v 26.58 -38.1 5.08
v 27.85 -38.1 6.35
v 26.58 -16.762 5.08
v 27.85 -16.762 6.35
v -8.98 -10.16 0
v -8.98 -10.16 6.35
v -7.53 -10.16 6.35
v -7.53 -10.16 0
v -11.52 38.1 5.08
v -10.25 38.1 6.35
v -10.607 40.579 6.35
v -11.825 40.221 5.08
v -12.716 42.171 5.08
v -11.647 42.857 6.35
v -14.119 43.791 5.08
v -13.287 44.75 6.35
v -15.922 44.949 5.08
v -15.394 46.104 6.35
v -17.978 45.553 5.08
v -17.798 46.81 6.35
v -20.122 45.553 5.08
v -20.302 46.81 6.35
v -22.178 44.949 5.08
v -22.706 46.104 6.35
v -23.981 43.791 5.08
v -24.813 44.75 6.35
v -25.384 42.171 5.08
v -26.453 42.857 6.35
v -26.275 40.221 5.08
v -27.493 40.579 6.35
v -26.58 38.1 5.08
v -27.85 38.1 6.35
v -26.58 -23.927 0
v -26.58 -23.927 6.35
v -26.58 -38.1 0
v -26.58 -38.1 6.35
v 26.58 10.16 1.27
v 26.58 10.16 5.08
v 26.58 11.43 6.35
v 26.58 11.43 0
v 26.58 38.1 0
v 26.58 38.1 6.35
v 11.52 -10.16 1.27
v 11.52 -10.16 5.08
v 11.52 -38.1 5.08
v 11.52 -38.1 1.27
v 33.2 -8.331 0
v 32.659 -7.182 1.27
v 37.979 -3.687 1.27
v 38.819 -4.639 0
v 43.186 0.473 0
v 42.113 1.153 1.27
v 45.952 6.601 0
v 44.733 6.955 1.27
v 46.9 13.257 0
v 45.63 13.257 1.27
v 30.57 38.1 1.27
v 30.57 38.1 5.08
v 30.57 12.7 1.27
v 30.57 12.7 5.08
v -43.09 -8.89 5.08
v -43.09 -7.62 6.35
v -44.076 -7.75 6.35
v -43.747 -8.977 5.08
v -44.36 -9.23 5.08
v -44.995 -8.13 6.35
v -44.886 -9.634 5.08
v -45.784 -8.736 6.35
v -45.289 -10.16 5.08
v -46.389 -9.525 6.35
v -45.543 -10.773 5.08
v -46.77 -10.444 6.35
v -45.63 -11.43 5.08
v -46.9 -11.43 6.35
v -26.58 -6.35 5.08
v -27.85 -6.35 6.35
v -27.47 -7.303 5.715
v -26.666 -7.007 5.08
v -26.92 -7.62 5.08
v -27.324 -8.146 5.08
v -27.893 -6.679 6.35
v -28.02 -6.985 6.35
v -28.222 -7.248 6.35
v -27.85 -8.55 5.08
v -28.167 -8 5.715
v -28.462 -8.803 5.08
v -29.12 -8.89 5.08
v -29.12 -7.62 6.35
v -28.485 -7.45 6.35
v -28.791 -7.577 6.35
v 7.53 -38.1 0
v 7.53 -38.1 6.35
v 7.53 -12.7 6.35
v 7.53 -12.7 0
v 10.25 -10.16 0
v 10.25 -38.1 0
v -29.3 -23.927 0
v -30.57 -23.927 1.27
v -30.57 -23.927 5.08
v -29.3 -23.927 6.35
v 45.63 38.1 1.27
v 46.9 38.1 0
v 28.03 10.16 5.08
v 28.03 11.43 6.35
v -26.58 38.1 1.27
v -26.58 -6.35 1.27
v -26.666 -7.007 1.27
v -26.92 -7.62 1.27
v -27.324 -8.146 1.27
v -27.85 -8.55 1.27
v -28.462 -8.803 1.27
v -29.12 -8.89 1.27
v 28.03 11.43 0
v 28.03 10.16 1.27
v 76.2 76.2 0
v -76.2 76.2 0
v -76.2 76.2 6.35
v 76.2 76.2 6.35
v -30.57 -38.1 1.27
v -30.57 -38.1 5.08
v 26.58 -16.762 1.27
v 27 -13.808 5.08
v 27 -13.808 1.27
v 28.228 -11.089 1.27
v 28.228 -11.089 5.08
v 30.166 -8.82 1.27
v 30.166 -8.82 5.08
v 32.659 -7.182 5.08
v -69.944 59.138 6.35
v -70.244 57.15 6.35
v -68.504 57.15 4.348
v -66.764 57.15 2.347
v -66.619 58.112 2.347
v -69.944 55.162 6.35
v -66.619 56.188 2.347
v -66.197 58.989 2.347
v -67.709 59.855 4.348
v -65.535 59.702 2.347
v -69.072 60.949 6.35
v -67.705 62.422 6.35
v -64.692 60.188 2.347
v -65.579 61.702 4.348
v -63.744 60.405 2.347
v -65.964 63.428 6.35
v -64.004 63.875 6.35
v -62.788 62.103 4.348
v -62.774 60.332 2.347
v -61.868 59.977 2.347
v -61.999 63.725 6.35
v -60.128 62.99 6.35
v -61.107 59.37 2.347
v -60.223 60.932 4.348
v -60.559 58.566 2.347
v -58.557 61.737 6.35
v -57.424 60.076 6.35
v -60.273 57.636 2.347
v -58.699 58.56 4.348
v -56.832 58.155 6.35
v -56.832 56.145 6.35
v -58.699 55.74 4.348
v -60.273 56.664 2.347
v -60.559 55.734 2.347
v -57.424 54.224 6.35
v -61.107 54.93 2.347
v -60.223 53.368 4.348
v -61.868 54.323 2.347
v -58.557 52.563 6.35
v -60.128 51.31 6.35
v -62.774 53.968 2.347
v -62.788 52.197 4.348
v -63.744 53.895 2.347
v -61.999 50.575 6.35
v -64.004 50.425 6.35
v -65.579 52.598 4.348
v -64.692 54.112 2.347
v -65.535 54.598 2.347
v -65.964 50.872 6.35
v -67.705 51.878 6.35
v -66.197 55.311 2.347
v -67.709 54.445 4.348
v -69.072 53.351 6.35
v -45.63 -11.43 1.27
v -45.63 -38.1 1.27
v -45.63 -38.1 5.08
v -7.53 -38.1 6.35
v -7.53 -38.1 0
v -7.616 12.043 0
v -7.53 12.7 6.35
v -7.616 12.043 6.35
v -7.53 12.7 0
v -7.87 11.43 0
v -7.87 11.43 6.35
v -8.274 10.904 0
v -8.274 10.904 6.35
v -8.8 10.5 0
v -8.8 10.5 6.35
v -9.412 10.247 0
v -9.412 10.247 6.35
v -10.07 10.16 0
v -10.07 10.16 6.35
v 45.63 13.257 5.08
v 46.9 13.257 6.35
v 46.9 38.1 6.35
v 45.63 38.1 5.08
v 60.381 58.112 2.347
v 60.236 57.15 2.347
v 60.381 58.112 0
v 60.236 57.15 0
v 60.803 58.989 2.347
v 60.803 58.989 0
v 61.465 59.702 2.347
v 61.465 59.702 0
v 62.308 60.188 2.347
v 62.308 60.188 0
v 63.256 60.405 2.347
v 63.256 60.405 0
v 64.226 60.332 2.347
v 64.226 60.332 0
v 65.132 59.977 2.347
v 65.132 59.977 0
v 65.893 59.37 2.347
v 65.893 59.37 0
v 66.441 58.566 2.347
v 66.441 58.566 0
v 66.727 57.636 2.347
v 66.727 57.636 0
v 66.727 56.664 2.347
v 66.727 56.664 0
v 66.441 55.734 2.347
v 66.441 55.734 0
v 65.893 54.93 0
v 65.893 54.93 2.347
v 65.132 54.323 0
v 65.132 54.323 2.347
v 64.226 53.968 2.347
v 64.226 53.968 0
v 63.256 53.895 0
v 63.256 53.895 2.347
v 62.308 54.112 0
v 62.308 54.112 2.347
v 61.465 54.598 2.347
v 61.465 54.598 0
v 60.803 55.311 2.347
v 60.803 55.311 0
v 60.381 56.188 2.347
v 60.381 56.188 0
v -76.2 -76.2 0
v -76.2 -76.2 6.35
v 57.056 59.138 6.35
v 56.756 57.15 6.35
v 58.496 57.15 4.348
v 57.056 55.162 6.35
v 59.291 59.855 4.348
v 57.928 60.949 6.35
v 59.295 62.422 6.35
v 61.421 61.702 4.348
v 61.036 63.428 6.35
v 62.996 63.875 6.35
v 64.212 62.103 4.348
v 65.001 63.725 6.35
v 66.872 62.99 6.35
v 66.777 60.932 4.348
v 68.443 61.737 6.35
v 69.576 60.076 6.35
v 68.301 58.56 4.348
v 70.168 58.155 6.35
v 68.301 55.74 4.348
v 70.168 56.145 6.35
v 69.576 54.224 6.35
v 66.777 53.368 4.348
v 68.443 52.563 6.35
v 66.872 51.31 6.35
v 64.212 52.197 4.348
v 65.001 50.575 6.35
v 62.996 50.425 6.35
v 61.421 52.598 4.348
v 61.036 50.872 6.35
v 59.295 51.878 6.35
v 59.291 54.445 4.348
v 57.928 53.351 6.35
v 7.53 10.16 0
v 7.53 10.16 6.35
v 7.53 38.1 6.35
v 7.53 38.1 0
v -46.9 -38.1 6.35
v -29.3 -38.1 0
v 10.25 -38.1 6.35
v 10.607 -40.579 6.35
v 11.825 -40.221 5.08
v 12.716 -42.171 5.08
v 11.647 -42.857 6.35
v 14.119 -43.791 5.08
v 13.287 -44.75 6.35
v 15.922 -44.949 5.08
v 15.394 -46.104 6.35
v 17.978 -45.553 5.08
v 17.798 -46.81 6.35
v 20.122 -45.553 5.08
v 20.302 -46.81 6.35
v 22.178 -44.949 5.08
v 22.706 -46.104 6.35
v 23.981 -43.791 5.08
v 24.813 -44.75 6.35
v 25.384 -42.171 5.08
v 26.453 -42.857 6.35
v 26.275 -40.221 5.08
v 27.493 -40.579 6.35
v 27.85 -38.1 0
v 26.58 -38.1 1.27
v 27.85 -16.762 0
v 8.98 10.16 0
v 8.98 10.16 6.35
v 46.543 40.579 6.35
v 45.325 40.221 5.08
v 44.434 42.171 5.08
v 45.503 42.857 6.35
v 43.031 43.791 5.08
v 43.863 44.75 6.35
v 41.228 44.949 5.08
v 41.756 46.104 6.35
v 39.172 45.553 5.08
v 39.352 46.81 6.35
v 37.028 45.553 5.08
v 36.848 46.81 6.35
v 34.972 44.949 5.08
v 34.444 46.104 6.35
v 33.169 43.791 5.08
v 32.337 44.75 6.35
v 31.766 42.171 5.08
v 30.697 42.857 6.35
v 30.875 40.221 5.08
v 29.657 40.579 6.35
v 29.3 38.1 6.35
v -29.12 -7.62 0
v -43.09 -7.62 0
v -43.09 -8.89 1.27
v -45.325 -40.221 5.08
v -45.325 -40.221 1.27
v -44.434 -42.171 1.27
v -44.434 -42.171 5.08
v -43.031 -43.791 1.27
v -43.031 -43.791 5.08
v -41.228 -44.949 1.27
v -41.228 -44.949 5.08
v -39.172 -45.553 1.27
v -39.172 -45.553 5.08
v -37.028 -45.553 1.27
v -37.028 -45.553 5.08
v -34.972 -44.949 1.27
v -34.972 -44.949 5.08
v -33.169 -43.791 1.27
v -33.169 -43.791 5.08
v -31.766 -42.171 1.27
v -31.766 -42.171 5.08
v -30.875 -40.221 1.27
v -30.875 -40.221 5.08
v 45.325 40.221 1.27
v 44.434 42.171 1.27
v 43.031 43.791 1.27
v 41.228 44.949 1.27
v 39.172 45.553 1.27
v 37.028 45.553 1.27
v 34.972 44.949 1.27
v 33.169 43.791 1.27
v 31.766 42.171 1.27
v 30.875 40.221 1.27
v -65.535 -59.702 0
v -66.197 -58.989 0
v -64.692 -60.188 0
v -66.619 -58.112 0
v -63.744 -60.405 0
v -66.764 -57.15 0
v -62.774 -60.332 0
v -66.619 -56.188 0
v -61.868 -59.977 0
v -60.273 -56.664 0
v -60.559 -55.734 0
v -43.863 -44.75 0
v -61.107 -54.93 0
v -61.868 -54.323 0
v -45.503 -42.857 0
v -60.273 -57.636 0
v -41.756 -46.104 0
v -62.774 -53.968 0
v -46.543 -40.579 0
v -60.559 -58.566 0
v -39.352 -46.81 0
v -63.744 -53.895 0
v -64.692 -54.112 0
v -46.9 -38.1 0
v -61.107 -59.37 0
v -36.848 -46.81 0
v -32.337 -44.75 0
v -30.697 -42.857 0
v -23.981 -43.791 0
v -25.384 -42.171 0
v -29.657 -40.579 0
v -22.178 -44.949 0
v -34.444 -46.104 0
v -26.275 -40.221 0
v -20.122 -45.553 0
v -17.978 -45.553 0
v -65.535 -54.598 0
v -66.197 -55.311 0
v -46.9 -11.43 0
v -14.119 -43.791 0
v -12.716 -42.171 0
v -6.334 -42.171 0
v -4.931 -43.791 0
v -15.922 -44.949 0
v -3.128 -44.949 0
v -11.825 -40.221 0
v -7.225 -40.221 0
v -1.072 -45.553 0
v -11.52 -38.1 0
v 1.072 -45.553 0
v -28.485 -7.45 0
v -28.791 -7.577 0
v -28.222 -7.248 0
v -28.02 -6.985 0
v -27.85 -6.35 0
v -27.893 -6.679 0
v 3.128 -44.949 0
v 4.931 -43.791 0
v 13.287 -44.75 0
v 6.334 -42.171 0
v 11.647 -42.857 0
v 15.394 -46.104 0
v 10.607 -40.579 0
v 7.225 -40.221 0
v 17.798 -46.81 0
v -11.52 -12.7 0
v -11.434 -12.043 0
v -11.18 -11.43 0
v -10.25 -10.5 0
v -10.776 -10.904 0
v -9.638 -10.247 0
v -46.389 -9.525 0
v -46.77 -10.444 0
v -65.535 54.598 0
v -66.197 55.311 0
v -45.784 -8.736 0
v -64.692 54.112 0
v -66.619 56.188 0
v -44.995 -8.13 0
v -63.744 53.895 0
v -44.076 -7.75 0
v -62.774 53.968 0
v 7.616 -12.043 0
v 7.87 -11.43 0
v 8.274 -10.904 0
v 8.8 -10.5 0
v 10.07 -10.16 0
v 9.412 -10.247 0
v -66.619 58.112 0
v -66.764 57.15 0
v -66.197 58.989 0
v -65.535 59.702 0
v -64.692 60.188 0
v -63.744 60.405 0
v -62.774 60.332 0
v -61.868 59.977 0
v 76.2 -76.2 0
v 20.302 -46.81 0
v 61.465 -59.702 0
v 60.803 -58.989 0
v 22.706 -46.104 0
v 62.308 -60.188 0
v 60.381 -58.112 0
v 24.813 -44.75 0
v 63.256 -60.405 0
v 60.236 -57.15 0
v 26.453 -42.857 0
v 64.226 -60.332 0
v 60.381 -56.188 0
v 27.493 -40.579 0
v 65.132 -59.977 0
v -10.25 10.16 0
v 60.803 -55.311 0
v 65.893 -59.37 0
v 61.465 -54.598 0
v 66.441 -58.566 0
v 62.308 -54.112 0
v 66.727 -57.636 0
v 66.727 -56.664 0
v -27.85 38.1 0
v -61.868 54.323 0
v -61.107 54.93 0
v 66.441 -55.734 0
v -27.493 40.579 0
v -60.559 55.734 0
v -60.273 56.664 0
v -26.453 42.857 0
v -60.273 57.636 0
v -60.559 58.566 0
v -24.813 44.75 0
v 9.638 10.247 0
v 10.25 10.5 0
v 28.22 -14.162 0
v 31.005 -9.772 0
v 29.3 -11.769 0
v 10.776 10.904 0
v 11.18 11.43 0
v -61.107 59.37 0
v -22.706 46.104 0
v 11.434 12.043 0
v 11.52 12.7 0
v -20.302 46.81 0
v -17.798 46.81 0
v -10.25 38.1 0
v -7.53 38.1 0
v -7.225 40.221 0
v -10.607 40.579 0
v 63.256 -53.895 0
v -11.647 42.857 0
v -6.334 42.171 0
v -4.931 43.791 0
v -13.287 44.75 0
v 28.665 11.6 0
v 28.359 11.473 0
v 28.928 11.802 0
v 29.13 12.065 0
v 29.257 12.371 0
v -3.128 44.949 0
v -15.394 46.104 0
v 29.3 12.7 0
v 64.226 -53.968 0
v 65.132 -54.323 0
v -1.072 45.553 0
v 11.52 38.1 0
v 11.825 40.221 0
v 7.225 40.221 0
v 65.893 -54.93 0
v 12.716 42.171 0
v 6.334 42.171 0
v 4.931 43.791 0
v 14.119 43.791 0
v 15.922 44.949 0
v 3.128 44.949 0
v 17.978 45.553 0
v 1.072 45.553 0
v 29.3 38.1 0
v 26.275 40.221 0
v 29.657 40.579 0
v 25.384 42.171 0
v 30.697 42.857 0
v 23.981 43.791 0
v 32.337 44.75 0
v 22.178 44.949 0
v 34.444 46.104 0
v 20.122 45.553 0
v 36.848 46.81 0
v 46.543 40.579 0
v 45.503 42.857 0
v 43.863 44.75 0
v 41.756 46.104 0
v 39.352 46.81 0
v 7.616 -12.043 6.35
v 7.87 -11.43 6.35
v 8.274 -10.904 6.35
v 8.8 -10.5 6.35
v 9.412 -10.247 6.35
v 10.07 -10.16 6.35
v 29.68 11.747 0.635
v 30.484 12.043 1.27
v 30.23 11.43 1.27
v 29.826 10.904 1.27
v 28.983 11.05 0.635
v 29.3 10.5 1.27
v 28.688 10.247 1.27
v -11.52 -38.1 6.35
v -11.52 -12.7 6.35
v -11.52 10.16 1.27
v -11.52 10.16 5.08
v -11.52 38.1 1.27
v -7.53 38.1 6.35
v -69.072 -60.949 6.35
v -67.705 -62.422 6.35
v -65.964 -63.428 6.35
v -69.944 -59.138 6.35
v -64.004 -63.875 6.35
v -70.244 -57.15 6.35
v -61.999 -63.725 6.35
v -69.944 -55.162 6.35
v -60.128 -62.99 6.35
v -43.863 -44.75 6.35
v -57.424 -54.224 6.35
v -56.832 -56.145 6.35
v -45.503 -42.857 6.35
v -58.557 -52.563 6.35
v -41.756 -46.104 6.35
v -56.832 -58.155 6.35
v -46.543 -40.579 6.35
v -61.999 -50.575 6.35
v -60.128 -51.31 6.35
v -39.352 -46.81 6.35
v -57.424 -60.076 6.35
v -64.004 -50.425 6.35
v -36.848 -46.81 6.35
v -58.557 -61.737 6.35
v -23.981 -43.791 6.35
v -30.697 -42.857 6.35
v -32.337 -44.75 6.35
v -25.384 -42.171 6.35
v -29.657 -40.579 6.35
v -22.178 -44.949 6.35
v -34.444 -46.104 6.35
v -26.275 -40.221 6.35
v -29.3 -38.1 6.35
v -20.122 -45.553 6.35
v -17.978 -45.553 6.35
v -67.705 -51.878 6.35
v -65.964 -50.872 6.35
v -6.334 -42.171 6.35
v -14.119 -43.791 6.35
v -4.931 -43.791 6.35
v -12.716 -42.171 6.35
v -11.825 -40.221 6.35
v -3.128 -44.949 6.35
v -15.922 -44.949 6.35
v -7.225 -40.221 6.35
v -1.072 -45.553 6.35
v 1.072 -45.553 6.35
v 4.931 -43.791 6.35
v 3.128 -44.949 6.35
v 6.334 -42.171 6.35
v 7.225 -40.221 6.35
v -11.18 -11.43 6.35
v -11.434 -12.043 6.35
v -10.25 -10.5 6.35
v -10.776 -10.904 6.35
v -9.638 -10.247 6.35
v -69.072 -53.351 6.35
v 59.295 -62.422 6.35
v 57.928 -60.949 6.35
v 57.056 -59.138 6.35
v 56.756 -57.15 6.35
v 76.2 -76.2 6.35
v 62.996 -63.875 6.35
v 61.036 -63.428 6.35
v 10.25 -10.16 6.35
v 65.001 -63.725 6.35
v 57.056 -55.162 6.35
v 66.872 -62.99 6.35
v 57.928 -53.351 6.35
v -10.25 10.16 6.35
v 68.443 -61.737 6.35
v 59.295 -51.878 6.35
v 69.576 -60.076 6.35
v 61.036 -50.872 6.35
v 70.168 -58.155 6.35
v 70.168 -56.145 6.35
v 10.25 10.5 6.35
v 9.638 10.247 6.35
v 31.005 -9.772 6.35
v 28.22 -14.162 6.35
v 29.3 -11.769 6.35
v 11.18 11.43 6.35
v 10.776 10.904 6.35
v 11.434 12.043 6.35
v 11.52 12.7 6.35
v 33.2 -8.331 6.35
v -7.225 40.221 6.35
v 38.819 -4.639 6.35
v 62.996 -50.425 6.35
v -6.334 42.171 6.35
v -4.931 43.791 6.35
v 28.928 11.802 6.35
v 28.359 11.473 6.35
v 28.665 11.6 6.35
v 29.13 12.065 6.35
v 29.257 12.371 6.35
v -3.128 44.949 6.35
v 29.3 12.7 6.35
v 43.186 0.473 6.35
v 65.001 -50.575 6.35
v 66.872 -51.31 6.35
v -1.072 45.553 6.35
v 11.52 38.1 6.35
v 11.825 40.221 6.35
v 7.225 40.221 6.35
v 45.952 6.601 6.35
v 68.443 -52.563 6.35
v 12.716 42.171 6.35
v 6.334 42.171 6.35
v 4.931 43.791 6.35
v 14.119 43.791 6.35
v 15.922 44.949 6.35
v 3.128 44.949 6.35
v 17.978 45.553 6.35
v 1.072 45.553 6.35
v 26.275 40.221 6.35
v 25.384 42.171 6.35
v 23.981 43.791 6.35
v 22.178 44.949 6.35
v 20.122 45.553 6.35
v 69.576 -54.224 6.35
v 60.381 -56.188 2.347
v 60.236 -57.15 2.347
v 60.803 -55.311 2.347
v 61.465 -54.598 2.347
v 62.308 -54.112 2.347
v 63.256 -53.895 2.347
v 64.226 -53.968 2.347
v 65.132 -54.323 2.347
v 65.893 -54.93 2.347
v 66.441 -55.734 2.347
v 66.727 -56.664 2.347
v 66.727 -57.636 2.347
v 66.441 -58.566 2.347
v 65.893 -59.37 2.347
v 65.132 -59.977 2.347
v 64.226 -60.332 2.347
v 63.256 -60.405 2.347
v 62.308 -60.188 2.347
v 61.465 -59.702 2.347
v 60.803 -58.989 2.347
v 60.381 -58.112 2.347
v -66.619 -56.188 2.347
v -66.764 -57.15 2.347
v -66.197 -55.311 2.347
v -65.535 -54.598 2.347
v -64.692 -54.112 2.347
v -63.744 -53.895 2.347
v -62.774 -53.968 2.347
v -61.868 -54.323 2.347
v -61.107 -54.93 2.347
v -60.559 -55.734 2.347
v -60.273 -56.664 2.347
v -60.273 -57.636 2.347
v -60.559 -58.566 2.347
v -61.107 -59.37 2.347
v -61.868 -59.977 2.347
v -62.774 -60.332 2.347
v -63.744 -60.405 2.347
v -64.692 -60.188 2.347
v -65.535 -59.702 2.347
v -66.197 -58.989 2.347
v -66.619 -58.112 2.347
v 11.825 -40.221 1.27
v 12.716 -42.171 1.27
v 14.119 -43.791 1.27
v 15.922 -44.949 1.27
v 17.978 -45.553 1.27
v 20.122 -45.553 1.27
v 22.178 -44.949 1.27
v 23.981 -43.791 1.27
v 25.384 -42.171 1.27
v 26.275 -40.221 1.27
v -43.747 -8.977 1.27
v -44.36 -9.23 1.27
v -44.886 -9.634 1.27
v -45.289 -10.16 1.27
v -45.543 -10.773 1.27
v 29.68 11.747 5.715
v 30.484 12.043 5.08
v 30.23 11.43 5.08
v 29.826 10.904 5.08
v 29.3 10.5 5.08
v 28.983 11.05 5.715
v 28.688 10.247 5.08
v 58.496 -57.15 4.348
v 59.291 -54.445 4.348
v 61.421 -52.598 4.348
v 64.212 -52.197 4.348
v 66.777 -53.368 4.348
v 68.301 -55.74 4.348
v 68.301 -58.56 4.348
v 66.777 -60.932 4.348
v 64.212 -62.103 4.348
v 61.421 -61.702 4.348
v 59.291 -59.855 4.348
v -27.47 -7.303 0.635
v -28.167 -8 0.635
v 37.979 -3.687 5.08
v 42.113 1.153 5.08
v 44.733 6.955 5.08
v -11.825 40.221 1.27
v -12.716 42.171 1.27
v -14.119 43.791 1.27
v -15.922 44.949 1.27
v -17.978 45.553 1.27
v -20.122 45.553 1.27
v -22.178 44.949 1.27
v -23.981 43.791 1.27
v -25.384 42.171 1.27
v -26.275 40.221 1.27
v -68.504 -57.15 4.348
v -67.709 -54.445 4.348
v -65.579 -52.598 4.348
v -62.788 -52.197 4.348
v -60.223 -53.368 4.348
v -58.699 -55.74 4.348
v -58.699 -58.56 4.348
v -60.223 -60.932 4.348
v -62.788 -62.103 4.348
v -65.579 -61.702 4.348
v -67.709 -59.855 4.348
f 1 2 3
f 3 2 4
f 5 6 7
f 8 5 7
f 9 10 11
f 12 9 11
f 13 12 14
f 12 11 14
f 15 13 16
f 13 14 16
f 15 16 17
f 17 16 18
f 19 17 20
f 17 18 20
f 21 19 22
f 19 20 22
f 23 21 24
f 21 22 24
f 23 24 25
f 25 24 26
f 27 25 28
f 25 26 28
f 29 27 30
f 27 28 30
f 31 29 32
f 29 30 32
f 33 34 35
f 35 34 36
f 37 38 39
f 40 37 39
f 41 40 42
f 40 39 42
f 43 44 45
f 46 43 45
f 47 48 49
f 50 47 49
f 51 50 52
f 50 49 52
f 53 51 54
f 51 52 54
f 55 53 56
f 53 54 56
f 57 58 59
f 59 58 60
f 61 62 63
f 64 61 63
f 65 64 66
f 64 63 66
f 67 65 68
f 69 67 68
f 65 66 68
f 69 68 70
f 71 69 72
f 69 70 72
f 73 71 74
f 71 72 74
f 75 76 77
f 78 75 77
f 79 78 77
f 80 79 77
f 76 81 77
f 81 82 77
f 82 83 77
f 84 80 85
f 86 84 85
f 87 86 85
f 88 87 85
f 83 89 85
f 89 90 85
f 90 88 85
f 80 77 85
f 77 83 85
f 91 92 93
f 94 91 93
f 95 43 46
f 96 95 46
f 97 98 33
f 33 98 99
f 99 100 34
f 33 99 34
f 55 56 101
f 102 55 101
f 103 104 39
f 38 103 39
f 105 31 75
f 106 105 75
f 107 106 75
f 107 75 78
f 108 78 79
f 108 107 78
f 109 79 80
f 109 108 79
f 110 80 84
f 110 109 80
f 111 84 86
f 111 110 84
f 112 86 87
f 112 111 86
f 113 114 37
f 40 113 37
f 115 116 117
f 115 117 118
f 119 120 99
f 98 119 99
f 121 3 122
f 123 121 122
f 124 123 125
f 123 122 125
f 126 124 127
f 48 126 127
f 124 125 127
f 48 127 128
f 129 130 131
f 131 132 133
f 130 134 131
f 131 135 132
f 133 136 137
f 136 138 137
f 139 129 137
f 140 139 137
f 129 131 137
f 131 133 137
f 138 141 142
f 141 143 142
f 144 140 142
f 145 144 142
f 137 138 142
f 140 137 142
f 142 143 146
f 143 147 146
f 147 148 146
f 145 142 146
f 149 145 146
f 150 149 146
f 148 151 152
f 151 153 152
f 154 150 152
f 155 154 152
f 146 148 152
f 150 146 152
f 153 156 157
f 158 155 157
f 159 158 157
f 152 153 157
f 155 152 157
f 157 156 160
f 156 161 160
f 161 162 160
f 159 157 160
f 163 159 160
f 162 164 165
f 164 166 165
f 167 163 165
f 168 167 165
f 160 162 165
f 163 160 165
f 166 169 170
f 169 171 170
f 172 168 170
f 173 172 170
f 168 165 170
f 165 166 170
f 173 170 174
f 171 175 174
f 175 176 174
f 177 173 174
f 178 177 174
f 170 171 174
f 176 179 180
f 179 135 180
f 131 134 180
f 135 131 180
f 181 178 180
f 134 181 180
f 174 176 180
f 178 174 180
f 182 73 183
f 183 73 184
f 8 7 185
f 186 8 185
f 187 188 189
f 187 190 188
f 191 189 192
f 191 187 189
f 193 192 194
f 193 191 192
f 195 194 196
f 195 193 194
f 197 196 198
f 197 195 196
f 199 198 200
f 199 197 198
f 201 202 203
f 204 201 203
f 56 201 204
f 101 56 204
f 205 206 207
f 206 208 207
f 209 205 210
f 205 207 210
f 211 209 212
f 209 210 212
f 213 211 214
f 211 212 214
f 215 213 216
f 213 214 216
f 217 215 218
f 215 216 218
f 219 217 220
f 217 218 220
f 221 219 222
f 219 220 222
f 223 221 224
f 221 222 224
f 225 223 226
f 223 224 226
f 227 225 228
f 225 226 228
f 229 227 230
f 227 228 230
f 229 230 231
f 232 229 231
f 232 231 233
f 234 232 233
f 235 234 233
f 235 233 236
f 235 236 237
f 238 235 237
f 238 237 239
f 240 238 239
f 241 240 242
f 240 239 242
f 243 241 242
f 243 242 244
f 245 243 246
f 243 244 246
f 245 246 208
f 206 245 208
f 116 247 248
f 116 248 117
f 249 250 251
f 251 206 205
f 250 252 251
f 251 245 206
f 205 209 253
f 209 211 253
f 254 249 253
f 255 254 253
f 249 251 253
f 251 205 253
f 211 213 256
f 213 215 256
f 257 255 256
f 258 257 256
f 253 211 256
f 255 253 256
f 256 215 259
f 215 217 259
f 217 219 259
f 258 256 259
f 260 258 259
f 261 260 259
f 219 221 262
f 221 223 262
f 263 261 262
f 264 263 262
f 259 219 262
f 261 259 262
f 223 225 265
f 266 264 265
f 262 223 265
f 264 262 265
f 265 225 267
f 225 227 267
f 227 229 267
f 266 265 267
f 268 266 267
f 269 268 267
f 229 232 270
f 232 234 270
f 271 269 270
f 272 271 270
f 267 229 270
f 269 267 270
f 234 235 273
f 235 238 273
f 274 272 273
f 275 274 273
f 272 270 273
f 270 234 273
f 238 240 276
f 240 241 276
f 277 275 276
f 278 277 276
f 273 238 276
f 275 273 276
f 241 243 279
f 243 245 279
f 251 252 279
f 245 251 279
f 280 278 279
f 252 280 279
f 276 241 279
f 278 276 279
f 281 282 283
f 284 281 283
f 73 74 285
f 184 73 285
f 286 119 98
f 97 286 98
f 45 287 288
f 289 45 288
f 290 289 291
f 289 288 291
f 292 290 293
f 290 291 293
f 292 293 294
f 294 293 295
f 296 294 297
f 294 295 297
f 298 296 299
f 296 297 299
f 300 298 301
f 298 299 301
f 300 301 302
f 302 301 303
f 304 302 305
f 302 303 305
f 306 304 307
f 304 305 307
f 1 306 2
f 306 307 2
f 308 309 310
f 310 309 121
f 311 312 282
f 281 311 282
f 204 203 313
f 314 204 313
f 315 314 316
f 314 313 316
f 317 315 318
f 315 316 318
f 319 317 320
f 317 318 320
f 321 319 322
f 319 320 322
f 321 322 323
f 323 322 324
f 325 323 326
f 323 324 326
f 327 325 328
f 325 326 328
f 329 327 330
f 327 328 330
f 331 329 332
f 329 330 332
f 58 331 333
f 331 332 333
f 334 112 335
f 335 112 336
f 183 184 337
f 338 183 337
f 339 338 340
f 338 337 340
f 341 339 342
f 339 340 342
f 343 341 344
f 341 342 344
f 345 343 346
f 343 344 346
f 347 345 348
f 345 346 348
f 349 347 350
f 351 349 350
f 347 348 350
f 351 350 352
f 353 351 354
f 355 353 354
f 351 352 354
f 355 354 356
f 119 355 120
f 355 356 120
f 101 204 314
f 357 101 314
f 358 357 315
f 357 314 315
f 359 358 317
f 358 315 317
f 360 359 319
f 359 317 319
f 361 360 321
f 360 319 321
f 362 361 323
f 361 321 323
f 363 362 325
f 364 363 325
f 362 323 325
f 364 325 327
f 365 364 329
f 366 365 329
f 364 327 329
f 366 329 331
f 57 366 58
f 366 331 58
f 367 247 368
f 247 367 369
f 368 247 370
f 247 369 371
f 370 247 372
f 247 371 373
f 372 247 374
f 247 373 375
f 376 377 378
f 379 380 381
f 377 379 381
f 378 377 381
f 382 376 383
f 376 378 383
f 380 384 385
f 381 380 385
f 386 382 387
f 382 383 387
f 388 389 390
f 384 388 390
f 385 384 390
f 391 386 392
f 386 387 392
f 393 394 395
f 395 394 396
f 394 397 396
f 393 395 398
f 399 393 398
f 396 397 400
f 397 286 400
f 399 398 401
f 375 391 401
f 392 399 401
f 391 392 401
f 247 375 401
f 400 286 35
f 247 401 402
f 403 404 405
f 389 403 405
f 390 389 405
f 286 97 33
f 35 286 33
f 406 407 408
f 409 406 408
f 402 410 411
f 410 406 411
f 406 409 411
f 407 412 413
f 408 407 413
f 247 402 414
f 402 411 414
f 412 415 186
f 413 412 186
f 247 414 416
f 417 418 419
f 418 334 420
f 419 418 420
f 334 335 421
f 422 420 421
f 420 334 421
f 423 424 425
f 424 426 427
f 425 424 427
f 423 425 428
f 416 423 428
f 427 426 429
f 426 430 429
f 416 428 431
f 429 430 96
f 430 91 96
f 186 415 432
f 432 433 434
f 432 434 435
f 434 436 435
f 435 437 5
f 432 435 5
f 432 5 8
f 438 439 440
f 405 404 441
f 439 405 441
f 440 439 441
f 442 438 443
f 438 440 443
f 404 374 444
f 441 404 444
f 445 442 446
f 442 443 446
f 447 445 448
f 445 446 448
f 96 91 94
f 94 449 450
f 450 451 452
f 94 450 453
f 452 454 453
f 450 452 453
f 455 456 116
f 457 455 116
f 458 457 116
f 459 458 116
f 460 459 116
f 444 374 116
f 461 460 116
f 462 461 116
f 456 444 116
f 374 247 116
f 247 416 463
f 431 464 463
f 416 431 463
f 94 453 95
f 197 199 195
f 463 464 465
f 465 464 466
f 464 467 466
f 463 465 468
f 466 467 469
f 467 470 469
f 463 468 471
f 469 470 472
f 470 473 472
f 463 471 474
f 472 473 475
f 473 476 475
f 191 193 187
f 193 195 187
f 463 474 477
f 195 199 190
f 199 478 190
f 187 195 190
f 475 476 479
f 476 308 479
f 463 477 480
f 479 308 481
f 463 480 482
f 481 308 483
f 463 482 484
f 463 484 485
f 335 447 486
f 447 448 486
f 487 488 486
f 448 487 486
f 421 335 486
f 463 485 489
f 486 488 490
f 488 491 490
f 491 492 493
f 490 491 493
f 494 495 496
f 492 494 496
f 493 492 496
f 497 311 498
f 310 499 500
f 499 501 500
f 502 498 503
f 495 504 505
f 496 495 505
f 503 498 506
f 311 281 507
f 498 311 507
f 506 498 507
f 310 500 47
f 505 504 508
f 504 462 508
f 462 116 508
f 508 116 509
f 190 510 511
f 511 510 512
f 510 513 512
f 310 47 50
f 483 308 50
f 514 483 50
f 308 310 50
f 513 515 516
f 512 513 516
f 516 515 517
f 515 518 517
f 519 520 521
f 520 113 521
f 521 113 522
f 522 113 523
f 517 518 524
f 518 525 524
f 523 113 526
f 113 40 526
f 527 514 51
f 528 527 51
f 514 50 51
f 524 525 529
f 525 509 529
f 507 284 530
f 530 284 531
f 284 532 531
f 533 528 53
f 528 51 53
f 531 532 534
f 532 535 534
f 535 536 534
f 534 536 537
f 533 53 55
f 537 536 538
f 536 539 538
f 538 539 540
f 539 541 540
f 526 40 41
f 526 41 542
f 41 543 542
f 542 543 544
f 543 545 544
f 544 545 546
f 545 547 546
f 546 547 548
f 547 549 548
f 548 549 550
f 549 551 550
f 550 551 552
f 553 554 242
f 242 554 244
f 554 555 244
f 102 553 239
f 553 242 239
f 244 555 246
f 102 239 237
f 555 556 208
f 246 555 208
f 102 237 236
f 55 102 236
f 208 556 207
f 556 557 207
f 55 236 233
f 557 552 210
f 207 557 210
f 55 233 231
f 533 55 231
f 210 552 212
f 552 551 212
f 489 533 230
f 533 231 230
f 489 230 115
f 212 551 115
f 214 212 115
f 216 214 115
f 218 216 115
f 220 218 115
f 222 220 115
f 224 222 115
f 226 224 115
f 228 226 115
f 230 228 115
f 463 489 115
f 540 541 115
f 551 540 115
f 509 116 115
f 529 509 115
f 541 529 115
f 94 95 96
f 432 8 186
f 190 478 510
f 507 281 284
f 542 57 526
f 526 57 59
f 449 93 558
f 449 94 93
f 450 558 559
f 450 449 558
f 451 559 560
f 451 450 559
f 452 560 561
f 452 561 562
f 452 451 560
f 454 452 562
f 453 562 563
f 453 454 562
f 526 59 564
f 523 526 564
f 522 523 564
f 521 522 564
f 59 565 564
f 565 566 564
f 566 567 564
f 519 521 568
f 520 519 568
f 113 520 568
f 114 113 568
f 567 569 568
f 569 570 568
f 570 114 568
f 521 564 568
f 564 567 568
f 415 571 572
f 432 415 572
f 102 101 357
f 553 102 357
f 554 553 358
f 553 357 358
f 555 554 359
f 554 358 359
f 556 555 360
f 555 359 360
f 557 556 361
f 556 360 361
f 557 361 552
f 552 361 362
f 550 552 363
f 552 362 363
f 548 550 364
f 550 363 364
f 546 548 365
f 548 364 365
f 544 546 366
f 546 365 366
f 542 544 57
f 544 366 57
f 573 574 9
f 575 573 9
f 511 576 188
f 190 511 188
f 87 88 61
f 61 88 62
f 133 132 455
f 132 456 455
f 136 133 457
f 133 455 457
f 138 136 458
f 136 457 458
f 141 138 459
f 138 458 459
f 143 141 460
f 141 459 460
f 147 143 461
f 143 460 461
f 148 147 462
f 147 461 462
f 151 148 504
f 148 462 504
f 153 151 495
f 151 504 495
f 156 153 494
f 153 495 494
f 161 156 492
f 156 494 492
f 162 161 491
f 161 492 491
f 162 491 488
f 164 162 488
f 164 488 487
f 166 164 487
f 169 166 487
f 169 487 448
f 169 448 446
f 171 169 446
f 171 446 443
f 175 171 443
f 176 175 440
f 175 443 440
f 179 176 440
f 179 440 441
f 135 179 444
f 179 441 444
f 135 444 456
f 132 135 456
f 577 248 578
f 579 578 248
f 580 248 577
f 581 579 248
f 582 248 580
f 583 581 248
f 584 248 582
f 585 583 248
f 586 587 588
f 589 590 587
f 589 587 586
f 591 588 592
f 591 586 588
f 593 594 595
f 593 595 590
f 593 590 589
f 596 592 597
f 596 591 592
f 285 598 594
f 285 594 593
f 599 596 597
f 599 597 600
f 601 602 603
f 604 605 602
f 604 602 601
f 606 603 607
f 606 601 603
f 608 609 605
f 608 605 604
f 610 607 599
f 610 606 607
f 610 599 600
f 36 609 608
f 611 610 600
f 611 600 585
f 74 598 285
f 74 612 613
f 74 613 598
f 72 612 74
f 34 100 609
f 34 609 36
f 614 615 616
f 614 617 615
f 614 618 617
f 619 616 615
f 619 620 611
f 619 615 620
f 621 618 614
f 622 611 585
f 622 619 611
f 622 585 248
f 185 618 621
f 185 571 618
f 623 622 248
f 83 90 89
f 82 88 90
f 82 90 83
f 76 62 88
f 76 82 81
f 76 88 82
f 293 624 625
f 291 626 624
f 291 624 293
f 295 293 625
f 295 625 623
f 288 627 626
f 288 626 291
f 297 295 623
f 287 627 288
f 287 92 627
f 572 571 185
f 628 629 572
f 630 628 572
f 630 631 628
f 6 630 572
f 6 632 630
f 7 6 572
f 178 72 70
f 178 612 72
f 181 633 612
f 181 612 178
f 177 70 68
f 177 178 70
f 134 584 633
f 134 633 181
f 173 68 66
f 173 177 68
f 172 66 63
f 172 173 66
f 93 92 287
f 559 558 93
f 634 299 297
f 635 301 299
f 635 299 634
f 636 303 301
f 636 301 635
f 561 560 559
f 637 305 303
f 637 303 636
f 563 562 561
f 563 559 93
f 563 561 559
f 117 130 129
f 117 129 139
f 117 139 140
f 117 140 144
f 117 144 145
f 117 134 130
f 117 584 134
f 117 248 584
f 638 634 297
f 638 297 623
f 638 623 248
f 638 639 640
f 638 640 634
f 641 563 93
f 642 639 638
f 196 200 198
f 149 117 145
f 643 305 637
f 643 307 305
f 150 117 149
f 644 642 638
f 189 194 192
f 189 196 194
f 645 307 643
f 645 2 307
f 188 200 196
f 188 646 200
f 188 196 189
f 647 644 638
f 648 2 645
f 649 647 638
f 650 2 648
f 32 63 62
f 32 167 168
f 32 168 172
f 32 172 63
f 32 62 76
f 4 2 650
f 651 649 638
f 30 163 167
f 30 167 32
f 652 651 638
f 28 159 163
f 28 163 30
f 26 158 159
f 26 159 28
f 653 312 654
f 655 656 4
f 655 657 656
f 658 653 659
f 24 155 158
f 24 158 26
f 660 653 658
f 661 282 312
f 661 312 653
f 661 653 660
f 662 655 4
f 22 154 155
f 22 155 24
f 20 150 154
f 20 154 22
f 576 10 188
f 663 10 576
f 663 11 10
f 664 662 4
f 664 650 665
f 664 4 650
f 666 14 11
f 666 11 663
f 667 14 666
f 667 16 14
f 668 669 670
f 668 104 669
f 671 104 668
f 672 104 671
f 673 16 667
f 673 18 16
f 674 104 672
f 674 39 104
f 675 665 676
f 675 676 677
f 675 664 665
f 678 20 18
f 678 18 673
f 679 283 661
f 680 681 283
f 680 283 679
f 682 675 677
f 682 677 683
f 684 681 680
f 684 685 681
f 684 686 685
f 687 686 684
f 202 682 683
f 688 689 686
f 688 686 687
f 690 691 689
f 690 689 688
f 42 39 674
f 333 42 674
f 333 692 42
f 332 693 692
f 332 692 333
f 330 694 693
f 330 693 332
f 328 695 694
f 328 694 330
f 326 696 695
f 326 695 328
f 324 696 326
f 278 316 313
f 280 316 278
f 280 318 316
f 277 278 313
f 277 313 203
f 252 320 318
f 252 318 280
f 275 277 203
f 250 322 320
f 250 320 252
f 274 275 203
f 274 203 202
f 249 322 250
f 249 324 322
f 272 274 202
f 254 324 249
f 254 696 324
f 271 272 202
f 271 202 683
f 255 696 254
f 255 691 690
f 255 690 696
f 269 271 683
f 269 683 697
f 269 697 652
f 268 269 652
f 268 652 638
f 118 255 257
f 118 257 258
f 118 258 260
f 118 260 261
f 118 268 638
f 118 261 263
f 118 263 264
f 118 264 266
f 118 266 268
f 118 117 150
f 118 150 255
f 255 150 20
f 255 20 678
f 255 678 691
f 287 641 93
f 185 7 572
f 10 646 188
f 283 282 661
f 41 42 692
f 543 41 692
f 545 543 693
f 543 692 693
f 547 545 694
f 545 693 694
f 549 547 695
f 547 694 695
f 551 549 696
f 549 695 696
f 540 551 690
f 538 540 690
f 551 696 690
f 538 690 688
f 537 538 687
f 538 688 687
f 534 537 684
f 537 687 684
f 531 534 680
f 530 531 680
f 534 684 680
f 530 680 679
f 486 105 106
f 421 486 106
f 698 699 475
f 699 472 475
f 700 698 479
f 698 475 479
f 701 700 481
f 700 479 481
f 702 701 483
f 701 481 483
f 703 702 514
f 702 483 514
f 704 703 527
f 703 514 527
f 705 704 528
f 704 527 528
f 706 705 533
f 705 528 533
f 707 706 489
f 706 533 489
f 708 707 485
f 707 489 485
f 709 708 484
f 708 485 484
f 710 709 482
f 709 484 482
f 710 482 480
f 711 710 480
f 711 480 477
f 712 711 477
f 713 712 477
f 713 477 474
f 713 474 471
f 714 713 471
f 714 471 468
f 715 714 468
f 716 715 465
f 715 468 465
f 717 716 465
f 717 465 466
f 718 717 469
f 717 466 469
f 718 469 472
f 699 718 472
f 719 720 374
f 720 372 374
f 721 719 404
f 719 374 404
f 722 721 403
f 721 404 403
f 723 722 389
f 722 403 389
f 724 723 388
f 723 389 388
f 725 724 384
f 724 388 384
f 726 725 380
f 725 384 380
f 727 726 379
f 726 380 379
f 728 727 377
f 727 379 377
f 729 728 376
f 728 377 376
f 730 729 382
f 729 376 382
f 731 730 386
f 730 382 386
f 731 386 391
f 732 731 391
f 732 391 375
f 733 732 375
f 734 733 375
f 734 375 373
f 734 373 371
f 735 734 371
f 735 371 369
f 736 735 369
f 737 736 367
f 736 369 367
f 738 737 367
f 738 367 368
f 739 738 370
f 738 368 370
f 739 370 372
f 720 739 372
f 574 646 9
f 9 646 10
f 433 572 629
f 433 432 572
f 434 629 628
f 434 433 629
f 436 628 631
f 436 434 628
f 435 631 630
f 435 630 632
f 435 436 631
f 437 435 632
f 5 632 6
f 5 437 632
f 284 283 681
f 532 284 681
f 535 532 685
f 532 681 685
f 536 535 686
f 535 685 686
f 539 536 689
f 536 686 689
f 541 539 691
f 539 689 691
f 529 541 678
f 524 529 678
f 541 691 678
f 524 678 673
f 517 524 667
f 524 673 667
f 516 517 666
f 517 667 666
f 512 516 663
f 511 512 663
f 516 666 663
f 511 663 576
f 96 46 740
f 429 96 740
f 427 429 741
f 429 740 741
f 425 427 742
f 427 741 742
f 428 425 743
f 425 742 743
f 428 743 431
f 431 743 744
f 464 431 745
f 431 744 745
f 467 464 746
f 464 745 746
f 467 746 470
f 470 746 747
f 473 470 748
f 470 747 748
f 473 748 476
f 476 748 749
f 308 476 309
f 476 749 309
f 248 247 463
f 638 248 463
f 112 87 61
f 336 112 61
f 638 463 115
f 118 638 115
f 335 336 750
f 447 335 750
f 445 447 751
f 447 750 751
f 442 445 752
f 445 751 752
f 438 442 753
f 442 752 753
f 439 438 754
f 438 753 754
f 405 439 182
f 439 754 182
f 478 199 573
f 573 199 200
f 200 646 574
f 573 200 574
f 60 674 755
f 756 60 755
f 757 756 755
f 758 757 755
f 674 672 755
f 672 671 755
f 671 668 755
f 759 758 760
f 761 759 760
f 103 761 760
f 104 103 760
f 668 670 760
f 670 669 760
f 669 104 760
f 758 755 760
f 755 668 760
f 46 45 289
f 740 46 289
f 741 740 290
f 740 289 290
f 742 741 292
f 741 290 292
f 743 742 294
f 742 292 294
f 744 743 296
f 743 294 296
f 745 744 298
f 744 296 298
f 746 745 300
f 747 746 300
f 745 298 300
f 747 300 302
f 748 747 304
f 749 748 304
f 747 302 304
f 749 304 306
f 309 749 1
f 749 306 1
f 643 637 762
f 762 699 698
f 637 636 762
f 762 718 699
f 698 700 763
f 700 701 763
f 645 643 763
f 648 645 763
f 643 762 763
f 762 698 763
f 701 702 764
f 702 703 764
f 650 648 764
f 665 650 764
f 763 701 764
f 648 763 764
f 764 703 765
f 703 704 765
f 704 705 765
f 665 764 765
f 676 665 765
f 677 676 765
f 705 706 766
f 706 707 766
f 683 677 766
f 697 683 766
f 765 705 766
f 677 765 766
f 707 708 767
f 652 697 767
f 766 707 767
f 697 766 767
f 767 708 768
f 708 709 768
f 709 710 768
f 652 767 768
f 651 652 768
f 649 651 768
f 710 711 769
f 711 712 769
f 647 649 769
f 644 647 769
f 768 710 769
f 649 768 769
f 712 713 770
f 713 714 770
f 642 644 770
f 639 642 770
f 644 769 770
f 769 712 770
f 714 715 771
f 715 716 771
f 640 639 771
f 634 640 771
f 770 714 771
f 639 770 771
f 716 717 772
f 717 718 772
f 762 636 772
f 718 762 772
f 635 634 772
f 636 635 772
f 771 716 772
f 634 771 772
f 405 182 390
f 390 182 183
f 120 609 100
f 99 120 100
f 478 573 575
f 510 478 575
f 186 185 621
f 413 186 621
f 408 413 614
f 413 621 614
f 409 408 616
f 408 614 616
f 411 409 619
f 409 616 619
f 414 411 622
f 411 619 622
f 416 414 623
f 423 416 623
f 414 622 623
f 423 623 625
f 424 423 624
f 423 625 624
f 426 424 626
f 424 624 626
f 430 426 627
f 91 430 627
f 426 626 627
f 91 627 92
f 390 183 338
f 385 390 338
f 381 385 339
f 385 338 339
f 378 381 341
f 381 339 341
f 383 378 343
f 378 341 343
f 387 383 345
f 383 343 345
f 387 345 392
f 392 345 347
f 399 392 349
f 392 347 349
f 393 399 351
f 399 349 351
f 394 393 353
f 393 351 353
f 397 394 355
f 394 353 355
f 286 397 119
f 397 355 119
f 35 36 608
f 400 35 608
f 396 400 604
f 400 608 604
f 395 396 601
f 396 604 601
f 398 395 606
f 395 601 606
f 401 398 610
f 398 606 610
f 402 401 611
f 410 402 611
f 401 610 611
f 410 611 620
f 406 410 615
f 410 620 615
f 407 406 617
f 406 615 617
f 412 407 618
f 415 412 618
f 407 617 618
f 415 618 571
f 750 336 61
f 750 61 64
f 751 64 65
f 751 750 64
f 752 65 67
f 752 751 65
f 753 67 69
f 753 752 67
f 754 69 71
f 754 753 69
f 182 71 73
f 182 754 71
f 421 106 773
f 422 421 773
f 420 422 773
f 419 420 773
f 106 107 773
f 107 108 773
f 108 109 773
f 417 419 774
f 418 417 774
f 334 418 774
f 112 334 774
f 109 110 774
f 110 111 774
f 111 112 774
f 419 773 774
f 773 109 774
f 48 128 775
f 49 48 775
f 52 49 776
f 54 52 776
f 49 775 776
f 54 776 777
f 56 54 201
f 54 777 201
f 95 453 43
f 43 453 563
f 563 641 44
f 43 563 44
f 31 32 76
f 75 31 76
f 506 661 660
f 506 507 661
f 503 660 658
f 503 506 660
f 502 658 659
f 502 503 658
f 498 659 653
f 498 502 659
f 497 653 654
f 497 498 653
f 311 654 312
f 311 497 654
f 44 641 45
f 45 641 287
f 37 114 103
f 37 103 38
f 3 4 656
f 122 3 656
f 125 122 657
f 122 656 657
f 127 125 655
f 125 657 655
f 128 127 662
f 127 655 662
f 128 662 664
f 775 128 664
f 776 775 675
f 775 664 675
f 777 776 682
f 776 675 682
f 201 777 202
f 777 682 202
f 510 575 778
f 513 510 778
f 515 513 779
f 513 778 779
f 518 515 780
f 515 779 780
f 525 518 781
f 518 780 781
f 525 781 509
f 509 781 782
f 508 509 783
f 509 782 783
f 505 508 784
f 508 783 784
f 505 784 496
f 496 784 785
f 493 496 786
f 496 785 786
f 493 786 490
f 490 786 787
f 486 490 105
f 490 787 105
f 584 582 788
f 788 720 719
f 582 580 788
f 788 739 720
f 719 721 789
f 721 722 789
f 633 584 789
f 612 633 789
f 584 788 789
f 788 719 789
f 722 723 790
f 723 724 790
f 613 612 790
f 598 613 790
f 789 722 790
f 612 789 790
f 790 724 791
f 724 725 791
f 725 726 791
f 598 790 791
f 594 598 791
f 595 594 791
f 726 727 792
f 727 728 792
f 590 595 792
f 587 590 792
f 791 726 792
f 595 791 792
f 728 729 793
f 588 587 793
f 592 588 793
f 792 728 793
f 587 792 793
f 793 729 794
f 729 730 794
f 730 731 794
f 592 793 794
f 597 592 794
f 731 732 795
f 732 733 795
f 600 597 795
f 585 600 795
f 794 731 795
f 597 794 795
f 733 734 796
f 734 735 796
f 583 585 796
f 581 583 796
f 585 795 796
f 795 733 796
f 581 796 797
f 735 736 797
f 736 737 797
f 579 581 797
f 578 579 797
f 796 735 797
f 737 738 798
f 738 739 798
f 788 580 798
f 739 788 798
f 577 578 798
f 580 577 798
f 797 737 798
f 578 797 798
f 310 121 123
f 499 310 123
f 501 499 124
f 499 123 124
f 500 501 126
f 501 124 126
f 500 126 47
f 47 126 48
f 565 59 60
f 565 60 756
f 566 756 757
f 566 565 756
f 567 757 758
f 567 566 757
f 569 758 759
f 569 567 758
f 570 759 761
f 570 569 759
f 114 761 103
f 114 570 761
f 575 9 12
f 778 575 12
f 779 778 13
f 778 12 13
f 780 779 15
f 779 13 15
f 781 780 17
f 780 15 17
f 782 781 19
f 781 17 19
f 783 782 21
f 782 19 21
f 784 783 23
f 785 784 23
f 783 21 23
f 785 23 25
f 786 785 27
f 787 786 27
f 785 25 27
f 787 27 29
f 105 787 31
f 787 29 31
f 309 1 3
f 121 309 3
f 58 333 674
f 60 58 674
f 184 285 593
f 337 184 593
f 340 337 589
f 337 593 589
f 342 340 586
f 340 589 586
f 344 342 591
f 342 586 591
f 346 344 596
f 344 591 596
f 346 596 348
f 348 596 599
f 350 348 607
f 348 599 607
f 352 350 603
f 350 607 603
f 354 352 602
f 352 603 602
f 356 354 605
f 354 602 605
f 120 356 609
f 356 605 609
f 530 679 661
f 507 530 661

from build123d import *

# Parameters (mm, degrees)
F0_W           = 152.4
F0_H           = 152.4
F1_DEPTH       = 6.35
F3_DEPTH       = 6.351
F4_R           = 2.54
F5_SIZE        = 1.27
F7_D           = 6.5278
F7_CSINK_D     = 13.4874
F7_CSINK_ANGLE = 82


with BuildPart() as f1:
    # F0 (on Top) → F1 (new body)
    with BuildSketch(Plane.XY):
        Rectangle(F0_W, F0_H)
    extrude(amount=F1_DEPTH)

    # F2 (on face) → F3 (cut, through all)
    with BuildSketch(Plane.XY.offset(6.35)):
        with BuildLine():
            Line((7.529644, 10.16), (7.529644, 38.1))
            ThreePointArc((7.529644, 38.1), (0, 45.629644), (-7.529644, 38.1))
            Line((-7.529644, 38.1), (-7.529644, 10.16))
            Line((-7.529644, 10.16), (-11.520356, 10.16))
            Line((-11.520356, 10.16), (-11.520356, 38.1))
            ThreePointArc((-11.520356, 38.1), (-19.05, 45.629644), (-26.579644, 38.1))
            Line((-26.579644, 38.1), (-26.579644, 0))
            Line((-26.579644, 0), (-26.579644, -8.89))
            Line((-26.579644, -8.89), (-45.629644, -8.89))
            Line((-45.629644, -8.89), (-45.629644, -38.1))
            ThreePointArc((-45.629644, -38.1), (-38.1, -45.629644), (-30.570356, -38.1))
            Line((-30.570356, -38.1), (-30.570356, -23.9268))
            Line((-30.570356, -23.9268), (-26.579644, -23.9268))
            Line((-26.579644, -23.9268), (-26.579644, -38.1))
            ThreePointArc((-26.579644, -38.1), (-19.05, -45.629644), (-11.520356, -38.1))
            Line((-11.520356, -38.1), (-11.520356, -10.16))
            Line((-11.520356, -10.16), (-7.529644, -10.16))
            Line((-7.529644, -10.16), (-7.529644, -38.1))
            ThreePointArc((-7.529644, -38.1), (0, -45.629644), (7.529644, -38.1))
            Line((7.529644, -38.1), (7.529644, -10.16))
            Line((7.529644, -10.16), (11.520356, -10.16))
            Line((11.520356, -10.16), (11.520356, -38.1))
            ThreePointArc((11.520356, -38.1), (19.05, -45.629644), (26.579644, -38.1))
            Line((26.579644, -38.1), (26.579644, -16.761795))
            ThreePointArc((26.579644, -16.761795), (28.227842, -11.088573), (32.659292, -7.181625))
            ThreePointArc((32.659292, -7.181625), (42.113371, 1.15348), (45.629644, 13.256762))
            Line((45.629644, 13.256762), (45.629644, 38.1))
            ThreePointArc((45.629644, 38.1), (38.1, 45.629644), (30.570356, 38.1))
            Line((30.570356, 38.1), (30.570356, 10.16))
            Line((30.570356, 10.16), (26.579644, 10.16))
            Line((26.579644, 10.16), (26.579644, 38.1))
            ThreePointArc((26.579644, 38.1), (19.05, 45.629644), (11.520356, 38.1))
            Line((11.520356, 38.1), (11.520356, 10.16))
            Line((11.520356, 10.16), (7.529644, 10.16))
        make_face()
    extrude(amount=-F3_DEPTH, mode=Mode.SUBTRACT)

    # F4
    f4_edges = [f1.edges().sort_by_distance(p)[0] for p in [
        (-7.529644, 10.16, 3.175),
        (-11.520356, -10.16, 3.175),
        (7.529644, -10.16, 3.175),
        (11.520356, 10.16, 3.175),
        (30.570356, 10.16, 3.175),
        (-26.579644, -8.89, 3.175),
        (-45.629644, -8.89, 3.175),
    ]]
    fillet(f4_edges, radius=F4_R)

    # F5
    f5_edges = [f1.edges().sort_by_distance(p)[0] for p in [
        (45.629644, 25.678381, 6.35),
        (30.570356, 25.4, 0),
        (-45.629644, -24.765, 6.35),
        (-30.570356, -31.0134, 0),
    ]]
    chamfer(f5_edges, length=F5_SIZE)

    # F7 (through all)
    with Locations(Plane.XY.offset(6.35)):
        with Locations((-63.5, 57.15), (63.5, 57.15), (63.5, -57.15), (-63.5, -57.15)):
            CounterSinkHole(F7_D / 2, F7_CSINK_D / 2, counter_sink_angle=F7_CSINK_ANGLE)


solid = f1.part
